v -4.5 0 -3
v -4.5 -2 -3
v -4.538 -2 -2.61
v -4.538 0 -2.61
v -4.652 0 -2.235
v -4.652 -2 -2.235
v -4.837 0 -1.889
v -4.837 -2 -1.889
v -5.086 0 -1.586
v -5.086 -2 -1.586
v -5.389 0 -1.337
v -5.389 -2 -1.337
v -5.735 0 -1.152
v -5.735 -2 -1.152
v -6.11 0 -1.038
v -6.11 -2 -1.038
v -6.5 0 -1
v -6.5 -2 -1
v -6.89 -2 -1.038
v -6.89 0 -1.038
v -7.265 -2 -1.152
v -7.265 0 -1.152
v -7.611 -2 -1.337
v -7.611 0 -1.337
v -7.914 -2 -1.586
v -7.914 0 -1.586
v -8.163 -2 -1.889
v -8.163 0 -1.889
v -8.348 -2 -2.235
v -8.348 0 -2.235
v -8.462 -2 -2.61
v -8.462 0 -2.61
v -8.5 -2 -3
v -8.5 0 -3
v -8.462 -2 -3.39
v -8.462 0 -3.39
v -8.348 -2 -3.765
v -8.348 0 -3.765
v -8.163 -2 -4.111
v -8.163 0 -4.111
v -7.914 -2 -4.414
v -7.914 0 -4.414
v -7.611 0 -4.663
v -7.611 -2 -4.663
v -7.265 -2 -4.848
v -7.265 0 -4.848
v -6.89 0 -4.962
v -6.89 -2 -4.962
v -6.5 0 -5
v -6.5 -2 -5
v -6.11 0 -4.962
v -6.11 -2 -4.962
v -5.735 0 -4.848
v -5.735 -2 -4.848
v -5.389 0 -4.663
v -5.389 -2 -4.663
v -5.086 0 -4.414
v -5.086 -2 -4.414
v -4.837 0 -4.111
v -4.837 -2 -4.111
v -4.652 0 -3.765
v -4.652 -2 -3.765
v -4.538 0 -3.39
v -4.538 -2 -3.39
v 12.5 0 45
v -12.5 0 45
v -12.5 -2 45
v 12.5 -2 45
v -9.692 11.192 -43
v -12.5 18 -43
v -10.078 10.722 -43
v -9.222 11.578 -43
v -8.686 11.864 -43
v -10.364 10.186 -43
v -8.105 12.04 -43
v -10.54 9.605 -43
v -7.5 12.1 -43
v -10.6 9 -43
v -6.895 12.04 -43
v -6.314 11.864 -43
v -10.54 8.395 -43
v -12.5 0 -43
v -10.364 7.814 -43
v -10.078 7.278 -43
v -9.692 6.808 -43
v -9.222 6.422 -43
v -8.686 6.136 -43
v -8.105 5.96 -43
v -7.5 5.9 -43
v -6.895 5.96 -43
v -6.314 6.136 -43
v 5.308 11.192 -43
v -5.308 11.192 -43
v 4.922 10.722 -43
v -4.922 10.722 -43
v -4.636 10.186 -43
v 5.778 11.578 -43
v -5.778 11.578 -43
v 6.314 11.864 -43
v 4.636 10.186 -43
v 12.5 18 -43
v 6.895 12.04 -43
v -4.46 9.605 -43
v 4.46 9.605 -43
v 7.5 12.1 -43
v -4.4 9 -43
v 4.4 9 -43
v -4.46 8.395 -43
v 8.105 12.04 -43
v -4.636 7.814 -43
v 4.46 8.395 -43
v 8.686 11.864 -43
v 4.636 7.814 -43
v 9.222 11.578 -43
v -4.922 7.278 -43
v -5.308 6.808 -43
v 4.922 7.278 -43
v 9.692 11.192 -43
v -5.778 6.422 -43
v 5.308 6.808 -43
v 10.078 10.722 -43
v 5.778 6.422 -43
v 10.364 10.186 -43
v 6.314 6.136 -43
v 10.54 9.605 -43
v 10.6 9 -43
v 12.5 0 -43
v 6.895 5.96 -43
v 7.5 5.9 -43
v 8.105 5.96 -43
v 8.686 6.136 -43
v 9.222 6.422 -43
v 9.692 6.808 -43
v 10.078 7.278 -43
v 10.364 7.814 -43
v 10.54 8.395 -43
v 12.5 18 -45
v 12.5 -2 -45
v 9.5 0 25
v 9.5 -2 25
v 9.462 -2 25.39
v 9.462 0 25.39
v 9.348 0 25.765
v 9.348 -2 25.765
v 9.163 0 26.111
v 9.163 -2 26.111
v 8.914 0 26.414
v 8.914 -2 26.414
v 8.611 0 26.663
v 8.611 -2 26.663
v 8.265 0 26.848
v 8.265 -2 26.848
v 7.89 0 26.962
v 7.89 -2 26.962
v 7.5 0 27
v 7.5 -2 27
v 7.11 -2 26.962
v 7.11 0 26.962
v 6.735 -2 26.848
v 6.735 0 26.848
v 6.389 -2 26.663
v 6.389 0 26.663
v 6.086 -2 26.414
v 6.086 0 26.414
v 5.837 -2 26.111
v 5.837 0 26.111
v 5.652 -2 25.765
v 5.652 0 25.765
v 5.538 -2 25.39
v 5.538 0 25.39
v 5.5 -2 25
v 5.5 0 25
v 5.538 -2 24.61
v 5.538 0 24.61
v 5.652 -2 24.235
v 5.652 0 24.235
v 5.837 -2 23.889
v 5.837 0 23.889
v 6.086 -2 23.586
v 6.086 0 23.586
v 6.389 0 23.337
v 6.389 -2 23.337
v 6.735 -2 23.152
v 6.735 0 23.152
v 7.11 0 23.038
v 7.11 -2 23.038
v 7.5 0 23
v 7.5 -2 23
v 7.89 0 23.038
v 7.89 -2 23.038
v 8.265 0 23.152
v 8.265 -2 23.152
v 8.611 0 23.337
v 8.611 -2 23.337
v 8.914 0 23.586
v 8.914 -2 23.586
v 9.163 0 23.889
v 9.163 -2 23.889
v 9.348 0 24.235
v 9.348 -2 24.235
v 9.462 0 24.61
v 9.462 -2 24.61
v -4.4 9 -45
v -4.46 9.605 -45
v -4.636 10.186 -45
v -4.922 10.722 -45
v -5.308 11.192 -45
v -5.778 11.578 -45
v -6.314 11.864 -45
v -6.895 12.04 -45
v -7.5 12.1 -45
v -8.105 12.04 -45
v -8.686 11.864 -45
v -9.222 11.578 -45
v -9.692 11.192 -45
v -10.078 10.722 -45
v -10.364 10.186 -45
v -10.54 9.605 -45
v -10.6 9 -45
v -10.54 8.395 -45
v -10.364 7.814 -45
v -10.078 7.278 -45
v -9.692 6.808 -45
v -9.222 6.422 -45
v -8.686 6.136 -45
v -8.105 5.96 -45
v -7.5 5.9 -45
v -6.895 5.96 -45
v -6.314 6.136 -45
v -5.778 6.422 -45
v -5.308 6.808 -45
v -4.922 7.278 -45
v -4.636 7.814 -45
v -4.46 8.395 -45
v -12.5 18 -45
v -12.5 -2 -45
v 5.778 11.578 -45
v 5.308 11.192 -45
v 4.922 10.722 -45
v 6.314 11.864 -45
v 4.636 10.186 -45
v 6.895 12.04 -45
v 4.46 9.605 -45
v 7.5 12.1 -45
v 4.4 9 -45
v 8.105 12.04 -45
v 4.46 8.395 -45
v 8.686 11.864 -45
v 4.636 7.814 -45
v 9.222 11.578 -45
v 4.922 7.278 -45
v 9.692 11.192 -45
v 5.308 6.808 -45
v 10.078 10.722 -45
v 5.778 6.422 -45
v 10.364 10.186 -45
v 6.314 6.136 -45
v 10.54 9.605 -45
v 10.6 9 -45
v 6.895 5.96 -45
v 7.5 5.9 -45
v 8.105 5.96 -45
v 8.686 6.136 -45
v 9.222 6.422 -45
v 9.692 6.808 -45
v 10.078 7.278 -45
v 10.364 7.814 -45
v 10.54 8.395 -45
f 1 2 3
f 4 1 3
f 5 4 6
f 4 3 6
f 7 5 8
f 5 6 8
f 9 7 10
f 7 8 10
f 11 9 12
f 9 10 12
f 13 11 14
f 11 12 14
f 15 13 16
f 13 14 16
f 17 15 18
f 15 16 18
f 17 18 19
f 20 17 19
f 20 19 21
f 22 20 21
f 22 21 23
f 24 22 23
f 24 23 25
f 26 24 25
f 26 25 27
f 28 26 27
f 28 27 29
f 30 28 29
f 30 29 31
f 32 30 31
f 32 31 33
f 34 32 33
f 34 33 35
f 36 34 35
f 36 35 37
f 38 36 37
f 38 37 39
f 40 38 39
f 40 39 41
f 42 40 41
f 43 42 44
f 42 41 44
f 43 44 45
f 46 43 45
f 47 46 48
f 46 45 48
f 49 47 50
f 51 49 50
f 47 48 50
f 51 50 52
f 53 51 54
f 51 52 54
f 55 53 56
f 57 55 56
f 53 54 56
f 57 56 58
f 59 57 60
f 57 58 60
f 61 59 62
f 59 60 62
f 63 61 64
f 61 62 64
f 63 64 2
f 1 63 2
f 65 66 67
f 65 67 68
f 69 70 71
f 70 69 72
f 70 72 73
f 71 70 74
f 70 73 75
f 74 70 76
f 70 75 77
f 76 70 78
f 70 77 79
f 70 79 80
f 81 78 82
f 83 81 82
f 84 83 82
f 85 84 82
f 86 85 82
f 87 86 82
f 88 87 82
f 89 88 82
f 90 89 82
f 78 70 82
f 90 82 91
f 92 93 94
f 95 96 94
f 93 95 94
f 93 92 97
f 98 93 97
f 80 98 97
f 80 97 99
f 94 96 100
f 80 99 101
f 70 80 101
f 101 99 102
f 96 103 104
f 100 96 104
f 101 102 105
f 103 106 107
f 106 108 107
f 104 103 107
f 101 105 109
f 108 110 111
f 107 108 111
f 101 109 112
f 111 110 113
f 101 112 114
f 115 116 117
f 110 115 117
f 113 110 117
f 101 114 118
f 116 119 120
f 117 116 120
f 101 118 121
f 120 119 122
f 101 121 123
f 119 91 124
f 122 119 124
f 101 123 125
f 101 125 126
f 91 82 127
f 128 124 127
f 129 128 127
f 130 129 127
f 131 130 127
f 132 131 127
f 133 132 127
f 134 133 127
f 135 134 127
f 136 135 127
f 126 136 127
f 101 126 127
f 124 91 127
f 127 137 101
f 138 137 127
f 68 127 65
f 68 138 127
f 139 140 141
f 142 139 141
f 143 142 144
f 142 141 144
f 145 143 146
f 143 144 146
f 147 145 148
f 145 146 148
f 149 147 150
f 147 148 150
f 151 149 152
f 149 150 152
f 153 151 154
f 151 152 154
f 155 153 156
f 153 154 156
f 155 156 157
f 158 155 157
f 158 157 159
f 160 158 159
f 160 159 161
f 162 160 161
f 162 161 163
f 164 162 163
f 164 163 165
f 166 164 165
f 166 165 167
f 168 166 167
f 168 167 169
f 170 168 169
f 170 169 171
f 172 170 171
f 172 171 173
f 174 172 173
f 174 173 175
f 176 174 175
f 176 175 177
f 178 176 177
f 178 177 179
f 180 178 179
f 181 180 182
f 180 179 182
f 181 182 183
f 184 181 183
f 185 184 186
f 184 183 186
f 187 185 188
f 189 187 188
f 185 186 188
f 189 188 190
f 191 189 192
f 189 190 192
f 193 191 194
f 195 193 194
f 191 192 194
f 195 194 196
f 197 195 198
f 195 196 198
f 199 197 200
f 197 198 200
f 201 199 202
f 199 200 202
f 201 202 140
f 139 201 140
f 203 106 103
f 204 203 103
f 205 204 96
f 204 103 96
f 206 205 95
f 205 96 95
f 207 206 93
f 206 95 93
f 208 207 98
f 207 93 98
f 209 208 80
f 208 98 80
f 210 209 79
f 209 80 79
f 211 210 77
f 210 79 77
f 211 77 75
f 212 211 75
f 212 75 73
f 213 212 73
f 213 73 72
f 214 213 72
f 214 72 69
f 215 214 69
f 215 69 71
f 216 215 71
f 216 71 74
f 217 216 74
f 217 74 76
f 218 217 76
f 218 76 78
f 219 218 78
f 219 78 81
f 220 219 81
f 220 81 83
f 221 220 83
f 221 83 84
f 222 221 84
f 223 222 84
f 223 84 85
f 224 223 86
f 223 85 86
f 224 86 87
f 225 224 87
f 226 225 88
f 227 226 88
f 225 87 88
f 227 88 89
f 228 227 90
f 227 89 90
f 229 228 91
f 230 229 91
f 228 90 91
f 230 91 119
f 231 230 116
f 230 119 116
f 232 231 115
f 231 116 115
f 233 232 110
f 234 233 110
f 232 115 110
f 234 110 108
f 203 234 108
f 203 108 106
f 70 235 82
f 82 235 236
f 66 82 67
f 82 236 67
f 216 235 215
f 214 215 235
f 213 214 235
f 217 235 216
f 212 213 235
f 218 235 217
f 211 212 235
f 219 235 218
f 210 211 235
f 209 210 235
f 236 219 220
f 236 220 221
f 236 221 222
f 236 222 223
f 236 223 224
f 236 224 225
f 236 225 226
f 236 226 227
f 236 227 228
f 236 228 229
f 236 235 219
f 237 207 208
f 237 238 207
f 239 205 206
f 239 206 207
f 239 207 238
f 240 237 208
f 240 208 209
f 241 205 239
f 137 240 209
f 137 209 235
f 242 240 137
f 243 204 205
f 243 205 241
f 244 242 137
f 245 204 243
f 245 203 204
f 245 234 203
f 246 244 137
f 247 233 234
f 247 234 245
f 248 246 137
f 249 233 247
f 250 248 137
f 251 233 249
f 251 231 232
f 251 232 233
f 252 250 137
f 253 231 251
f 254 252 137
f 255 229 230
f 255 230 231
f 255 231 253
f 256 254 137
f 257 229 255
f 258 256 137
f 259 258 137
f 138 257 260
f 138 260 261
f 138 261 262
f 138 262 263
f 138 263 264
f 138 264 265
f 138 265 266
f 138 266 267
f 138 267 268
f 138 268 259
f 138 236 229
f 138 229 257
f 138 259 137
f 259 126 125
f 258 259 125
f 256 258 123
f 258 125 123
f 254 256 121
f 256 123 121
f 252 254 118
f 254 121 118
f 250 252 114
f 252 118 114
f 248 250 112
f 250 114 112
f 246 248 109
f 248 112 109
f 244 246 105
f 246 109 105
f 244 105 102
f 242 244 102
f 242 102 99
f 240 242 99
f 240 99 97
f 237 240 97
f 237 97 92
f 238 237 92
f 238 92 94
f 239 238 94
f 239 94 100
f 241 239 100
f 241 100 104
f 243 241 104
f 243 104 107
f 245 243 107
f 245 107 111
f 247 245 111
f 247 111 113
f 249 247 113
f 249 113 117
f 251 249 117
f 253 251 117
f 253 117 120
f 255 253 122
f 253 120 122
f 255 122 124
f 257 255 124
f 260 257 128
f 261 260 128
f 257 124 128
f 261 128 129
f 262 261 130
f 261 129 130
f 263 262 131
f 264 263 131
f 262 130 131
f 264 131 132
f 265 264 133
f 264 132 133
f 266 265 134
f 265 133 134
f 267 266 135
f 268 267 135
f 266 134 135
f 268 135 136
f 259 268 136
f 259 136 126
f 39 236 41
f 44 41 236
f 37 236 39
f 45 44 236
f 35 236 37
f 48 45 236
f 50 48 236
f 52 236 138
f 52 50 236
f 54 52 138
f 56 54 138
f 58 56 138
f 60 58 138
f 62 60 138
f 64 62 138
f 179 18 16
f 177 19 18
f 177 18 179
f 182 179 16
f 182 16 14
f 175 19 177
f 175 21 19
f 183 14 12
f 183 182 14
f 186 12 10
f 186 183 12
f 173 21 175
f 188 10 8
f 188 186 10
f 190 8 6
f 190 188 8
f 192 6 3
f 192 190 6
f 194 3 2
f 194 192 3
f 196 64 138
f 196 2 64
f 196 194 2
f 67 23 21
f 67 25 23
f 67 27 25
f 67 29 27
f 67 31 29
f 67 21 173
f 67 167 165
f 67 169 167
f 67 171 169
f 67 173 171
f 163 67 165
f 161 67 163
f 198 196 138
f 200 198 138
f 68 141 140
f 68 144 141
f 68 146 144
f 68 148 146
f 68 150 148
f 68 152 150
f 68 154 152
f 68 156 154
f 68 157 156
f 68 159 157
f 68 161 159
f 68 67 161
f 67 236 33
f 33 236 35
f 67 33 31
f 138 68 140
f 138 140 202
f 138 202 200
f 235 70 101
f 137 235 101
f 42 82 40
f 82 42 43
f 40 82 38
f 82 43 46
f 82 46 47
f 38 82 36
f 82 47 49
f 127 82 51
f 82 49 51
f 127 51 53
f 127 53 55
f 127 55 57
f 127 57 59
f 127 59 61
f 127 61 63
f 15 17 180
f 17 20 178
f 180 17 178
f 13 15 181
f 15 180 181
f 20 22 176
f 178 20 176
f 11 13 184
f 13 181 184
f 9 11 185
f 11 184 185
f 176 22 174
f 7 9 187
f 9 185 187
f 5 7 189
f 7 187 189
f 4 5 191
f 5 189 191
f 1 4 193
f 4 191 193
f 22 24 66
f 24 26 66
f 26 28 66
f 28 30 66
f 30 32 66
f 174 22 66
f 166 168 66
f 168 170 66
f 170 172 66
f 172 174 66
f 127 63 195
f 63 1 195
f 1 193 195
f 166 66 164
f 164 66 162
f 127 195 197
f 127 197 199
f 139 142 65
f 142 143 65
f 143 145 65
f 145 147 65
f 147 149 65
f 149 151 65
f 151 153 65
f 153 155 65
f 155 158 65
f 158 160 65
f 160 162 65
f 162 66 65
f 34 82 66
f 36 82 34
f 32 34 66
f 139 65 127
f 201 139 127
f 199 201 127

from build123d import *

# Parameters (mm, degrees)
F0_W     = 25
F0_H     = 90
F1_DEPTH = 2
F2_W     = 25
F2_H     = 2
F3_DEPTH = 20
F4_R     = 2
F5_DEPTH = 25
F6_R     = 3.1
F7_DEPTH = 25


with BuildPart() as f1:
    # F0 (on Front) → F1 (new body)
    with BuildSketch(Plane.XZ):
        Rectangle(F0_W, F0_H)
    extrude(amount=F1_DEPTH)

    # F2 (on face) → F3 (join)
    with BuildSketch(Plane.XZ.offset(2)):
        with Locations((0, -44)):
            Rectangle(F2_W, F2_H)
    extrude(amount=-F3_DEPTH)

    # F4 (on face) → F5 (cut)
    with BuildSketch(Plane.XZ.offset(2)):
        with Locations((7.5, 25)):
            Circle(F4_R)
        with Locations((-6.5, -3)):
            Circle(F4_R)
    extrude(amount=-F5_DEPTH, mode=Mode.SUBTRACT)

    # F6 (on face) → F7 (cut)
    with BuildSketch(Plane.XY.offset(-43)):
        with Locations((7.5, 9)):
            Circle(F6_R)
        with Locations((-7.5, 9)):
            Circle(F6_R)
    extrude(amount=-F7_DEPTH, mode=Mode.SUBTRACT)


solid = f1.part
